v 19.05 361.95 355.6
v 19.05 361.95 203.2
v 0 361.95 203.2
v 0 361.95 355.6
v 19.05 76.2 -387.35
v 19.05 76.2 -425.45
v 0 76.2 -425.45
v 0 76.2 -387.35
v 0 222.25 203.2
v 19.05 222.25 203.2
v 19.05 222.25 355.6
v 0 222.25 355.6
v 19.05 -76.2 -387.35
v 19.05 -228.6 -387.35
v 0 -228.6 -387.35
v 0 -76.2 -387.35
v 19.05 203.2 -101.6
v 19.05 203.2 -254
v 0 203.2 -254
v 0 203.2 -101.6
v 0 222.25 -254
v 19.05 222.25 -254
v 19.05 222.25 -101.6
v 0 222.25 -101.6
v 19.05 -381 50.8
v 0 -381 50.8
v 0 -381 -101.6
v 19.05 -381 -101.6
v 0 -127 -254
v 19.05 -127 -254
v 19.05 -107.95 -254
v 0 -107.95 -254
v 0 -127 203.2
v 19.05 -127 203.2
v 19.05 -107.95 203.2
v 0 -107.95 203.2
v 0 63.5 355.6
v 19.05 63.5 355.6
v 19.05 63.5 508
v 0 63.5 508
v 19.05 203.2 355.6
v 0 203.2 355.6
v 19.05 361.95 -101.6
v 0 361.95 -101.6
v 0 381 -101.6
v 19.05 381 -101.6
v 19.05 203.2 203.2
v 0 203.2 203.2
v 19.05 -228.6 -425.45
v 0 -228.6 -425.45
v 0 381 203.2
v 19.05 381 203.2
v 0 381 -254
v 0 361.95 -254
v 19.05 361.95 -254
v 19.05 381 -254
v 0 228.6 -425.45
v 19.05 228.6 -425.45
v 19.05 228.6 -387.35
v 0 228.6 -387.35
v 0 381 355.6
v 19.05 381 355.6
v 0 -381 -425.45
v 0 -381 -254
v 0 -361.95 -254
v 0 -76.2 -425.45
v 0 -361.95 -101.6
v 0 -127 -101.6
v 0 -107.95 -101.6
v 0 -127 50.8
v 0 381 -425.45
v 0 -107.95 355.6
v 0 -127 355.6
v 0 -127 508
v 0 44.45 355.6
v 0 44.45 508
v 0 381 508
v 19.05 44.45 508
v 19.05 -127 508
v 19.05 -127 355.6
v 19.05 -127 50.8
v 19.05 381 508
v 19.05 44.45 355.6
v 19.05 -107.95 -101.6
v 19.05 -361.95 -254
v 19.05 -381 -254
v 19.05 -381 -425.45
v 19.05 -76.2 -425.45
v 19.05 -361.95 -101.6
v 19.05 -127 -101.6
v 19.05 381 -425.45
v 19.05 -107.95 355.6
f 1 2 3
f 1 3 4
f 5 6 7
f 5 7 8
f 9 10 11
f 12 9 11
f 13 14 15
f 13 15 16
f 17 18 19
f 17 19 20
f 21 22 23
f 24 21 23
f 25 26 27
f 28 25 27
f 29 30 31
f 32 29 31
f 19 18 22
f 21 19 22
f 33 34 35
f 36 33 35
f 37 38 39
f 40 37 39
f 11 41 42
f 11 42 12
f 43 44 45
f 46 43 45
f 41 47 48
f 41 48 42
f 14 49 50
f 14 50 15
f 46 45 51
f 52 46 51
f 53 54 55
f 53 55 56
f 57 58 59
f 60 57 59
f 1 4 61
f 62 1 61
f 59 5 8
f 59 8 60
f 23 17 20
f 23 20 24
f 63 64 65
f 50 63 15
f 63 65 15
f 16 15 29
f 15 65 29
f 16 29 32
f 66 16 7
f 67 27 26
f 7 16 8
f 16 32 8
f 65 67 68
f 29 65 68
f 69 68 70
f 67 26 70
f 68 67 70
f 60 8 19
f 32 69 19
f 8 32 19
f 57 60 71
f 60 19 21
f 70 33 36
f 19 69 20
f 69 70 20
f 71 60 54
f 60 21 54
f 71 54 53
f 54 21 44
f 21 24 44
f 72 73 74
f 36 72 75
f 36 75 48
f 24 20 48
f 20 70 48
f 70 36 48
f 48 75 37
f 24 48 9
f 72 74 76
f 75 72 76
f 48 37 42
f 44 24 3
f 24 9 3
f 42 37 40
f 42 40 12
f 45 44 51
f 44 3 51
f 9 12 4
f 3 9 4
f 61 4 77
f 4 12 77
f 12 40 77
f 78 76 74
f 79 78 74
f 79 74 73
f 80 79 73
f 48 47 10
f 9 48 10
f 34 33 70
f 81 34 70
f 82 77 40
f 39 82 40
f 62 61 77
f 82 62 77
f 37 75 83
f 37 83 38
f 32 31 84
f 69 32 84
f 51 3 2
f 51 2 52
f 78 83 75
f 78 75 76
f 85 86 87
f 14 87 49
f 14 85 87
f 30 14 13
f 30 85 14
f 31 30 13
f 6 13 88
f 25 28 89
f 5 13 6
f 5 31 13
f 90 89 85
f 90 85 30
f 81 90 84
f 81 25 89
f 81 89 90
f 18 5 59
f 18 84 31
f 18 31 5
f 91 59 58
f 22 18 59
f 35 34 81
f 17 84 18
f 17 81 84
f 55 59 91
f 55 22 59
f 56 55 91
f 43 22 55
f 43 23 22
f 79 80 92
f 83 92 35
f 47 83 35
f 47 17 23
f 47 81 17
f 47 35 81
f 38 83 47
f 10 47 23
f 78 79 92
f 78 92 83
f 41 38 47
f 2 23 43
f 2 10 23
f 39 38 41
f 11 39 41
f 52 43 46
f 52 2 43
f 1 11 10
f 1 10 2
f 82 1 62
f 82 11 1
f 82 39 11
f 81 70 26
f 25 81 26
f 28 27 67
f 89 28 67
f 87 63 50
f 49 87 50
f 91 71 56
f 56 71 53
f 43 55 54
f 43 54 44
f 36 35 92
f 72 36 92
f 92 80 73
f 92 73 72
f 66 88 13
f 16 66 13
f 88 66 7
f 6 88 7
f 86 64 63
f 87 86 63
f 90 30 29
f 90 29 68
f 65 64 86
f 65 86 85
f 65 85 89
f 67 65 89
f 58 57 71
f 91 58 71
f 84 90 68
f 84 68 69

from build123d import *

# Parameters (mm, degrees)
F1_DEPTH = 19.05
F2_W     = 19.05
F2_H     = 152.4
F2_W_2   = 152.4
F2_H_2   = 38.1
F3_DEPTH = 19.05


# Not quite as in the source:
# - a length typed as a fraction of an inch, garbled in the dataset ("3 / 203.2 mm" for 3/8 in), is restored


with BuildPart() as f1:
    # F0 (on Right) → F1 (new body)
    with BuildSketch(Plane.YZ):
        Polygon((-127, 50.8), (-381, 50.8), (-381, -425.45), (381, -425.45), (381, 508), (-127, 508), align=None)
    extrude(amount=F1_DEPTH)

    # F2 (on face) → F3 (cut)
    with BuildSketch(Plane.YZ.offset(19.05)):
        with Locations((371.475, 279.4)):
            Rectangle(F2_W, F2_H)
        with Locations((371.475, -177.8)):
            Rectangle(F2_W, F2_H)
        with Locations((53.975, 431.8)):
            Rectangle(F2_W, F2_H)
        with Locations((-117.475, 279.4)):
            Rectangle(F2_W, F2_H)
        with Locations((212.725, 279.4)):
            Rectangle(F2_W, F2_H)
        with Locations((212.725, -177.8)):
            Rectangle(F2_W, F2_H)
        with Locations((-117.475, -177.8)):
            Rectangle(F2_W, F2_H)
        with Locations((-371.475, -177.8)):
            Rectangle(F2_W, F2_H)
        with Locations((152.4, -406.4)):
            Rectangle(F2_W_2, F2_H_2)
        with Locations((-152.4, -406.4)):
            Rectangle(F2_W_2, F2_H_2)
    extrude(amount=-F3_DEPTH, mode=Mode.SUBTRACT)


solid = f1.part
